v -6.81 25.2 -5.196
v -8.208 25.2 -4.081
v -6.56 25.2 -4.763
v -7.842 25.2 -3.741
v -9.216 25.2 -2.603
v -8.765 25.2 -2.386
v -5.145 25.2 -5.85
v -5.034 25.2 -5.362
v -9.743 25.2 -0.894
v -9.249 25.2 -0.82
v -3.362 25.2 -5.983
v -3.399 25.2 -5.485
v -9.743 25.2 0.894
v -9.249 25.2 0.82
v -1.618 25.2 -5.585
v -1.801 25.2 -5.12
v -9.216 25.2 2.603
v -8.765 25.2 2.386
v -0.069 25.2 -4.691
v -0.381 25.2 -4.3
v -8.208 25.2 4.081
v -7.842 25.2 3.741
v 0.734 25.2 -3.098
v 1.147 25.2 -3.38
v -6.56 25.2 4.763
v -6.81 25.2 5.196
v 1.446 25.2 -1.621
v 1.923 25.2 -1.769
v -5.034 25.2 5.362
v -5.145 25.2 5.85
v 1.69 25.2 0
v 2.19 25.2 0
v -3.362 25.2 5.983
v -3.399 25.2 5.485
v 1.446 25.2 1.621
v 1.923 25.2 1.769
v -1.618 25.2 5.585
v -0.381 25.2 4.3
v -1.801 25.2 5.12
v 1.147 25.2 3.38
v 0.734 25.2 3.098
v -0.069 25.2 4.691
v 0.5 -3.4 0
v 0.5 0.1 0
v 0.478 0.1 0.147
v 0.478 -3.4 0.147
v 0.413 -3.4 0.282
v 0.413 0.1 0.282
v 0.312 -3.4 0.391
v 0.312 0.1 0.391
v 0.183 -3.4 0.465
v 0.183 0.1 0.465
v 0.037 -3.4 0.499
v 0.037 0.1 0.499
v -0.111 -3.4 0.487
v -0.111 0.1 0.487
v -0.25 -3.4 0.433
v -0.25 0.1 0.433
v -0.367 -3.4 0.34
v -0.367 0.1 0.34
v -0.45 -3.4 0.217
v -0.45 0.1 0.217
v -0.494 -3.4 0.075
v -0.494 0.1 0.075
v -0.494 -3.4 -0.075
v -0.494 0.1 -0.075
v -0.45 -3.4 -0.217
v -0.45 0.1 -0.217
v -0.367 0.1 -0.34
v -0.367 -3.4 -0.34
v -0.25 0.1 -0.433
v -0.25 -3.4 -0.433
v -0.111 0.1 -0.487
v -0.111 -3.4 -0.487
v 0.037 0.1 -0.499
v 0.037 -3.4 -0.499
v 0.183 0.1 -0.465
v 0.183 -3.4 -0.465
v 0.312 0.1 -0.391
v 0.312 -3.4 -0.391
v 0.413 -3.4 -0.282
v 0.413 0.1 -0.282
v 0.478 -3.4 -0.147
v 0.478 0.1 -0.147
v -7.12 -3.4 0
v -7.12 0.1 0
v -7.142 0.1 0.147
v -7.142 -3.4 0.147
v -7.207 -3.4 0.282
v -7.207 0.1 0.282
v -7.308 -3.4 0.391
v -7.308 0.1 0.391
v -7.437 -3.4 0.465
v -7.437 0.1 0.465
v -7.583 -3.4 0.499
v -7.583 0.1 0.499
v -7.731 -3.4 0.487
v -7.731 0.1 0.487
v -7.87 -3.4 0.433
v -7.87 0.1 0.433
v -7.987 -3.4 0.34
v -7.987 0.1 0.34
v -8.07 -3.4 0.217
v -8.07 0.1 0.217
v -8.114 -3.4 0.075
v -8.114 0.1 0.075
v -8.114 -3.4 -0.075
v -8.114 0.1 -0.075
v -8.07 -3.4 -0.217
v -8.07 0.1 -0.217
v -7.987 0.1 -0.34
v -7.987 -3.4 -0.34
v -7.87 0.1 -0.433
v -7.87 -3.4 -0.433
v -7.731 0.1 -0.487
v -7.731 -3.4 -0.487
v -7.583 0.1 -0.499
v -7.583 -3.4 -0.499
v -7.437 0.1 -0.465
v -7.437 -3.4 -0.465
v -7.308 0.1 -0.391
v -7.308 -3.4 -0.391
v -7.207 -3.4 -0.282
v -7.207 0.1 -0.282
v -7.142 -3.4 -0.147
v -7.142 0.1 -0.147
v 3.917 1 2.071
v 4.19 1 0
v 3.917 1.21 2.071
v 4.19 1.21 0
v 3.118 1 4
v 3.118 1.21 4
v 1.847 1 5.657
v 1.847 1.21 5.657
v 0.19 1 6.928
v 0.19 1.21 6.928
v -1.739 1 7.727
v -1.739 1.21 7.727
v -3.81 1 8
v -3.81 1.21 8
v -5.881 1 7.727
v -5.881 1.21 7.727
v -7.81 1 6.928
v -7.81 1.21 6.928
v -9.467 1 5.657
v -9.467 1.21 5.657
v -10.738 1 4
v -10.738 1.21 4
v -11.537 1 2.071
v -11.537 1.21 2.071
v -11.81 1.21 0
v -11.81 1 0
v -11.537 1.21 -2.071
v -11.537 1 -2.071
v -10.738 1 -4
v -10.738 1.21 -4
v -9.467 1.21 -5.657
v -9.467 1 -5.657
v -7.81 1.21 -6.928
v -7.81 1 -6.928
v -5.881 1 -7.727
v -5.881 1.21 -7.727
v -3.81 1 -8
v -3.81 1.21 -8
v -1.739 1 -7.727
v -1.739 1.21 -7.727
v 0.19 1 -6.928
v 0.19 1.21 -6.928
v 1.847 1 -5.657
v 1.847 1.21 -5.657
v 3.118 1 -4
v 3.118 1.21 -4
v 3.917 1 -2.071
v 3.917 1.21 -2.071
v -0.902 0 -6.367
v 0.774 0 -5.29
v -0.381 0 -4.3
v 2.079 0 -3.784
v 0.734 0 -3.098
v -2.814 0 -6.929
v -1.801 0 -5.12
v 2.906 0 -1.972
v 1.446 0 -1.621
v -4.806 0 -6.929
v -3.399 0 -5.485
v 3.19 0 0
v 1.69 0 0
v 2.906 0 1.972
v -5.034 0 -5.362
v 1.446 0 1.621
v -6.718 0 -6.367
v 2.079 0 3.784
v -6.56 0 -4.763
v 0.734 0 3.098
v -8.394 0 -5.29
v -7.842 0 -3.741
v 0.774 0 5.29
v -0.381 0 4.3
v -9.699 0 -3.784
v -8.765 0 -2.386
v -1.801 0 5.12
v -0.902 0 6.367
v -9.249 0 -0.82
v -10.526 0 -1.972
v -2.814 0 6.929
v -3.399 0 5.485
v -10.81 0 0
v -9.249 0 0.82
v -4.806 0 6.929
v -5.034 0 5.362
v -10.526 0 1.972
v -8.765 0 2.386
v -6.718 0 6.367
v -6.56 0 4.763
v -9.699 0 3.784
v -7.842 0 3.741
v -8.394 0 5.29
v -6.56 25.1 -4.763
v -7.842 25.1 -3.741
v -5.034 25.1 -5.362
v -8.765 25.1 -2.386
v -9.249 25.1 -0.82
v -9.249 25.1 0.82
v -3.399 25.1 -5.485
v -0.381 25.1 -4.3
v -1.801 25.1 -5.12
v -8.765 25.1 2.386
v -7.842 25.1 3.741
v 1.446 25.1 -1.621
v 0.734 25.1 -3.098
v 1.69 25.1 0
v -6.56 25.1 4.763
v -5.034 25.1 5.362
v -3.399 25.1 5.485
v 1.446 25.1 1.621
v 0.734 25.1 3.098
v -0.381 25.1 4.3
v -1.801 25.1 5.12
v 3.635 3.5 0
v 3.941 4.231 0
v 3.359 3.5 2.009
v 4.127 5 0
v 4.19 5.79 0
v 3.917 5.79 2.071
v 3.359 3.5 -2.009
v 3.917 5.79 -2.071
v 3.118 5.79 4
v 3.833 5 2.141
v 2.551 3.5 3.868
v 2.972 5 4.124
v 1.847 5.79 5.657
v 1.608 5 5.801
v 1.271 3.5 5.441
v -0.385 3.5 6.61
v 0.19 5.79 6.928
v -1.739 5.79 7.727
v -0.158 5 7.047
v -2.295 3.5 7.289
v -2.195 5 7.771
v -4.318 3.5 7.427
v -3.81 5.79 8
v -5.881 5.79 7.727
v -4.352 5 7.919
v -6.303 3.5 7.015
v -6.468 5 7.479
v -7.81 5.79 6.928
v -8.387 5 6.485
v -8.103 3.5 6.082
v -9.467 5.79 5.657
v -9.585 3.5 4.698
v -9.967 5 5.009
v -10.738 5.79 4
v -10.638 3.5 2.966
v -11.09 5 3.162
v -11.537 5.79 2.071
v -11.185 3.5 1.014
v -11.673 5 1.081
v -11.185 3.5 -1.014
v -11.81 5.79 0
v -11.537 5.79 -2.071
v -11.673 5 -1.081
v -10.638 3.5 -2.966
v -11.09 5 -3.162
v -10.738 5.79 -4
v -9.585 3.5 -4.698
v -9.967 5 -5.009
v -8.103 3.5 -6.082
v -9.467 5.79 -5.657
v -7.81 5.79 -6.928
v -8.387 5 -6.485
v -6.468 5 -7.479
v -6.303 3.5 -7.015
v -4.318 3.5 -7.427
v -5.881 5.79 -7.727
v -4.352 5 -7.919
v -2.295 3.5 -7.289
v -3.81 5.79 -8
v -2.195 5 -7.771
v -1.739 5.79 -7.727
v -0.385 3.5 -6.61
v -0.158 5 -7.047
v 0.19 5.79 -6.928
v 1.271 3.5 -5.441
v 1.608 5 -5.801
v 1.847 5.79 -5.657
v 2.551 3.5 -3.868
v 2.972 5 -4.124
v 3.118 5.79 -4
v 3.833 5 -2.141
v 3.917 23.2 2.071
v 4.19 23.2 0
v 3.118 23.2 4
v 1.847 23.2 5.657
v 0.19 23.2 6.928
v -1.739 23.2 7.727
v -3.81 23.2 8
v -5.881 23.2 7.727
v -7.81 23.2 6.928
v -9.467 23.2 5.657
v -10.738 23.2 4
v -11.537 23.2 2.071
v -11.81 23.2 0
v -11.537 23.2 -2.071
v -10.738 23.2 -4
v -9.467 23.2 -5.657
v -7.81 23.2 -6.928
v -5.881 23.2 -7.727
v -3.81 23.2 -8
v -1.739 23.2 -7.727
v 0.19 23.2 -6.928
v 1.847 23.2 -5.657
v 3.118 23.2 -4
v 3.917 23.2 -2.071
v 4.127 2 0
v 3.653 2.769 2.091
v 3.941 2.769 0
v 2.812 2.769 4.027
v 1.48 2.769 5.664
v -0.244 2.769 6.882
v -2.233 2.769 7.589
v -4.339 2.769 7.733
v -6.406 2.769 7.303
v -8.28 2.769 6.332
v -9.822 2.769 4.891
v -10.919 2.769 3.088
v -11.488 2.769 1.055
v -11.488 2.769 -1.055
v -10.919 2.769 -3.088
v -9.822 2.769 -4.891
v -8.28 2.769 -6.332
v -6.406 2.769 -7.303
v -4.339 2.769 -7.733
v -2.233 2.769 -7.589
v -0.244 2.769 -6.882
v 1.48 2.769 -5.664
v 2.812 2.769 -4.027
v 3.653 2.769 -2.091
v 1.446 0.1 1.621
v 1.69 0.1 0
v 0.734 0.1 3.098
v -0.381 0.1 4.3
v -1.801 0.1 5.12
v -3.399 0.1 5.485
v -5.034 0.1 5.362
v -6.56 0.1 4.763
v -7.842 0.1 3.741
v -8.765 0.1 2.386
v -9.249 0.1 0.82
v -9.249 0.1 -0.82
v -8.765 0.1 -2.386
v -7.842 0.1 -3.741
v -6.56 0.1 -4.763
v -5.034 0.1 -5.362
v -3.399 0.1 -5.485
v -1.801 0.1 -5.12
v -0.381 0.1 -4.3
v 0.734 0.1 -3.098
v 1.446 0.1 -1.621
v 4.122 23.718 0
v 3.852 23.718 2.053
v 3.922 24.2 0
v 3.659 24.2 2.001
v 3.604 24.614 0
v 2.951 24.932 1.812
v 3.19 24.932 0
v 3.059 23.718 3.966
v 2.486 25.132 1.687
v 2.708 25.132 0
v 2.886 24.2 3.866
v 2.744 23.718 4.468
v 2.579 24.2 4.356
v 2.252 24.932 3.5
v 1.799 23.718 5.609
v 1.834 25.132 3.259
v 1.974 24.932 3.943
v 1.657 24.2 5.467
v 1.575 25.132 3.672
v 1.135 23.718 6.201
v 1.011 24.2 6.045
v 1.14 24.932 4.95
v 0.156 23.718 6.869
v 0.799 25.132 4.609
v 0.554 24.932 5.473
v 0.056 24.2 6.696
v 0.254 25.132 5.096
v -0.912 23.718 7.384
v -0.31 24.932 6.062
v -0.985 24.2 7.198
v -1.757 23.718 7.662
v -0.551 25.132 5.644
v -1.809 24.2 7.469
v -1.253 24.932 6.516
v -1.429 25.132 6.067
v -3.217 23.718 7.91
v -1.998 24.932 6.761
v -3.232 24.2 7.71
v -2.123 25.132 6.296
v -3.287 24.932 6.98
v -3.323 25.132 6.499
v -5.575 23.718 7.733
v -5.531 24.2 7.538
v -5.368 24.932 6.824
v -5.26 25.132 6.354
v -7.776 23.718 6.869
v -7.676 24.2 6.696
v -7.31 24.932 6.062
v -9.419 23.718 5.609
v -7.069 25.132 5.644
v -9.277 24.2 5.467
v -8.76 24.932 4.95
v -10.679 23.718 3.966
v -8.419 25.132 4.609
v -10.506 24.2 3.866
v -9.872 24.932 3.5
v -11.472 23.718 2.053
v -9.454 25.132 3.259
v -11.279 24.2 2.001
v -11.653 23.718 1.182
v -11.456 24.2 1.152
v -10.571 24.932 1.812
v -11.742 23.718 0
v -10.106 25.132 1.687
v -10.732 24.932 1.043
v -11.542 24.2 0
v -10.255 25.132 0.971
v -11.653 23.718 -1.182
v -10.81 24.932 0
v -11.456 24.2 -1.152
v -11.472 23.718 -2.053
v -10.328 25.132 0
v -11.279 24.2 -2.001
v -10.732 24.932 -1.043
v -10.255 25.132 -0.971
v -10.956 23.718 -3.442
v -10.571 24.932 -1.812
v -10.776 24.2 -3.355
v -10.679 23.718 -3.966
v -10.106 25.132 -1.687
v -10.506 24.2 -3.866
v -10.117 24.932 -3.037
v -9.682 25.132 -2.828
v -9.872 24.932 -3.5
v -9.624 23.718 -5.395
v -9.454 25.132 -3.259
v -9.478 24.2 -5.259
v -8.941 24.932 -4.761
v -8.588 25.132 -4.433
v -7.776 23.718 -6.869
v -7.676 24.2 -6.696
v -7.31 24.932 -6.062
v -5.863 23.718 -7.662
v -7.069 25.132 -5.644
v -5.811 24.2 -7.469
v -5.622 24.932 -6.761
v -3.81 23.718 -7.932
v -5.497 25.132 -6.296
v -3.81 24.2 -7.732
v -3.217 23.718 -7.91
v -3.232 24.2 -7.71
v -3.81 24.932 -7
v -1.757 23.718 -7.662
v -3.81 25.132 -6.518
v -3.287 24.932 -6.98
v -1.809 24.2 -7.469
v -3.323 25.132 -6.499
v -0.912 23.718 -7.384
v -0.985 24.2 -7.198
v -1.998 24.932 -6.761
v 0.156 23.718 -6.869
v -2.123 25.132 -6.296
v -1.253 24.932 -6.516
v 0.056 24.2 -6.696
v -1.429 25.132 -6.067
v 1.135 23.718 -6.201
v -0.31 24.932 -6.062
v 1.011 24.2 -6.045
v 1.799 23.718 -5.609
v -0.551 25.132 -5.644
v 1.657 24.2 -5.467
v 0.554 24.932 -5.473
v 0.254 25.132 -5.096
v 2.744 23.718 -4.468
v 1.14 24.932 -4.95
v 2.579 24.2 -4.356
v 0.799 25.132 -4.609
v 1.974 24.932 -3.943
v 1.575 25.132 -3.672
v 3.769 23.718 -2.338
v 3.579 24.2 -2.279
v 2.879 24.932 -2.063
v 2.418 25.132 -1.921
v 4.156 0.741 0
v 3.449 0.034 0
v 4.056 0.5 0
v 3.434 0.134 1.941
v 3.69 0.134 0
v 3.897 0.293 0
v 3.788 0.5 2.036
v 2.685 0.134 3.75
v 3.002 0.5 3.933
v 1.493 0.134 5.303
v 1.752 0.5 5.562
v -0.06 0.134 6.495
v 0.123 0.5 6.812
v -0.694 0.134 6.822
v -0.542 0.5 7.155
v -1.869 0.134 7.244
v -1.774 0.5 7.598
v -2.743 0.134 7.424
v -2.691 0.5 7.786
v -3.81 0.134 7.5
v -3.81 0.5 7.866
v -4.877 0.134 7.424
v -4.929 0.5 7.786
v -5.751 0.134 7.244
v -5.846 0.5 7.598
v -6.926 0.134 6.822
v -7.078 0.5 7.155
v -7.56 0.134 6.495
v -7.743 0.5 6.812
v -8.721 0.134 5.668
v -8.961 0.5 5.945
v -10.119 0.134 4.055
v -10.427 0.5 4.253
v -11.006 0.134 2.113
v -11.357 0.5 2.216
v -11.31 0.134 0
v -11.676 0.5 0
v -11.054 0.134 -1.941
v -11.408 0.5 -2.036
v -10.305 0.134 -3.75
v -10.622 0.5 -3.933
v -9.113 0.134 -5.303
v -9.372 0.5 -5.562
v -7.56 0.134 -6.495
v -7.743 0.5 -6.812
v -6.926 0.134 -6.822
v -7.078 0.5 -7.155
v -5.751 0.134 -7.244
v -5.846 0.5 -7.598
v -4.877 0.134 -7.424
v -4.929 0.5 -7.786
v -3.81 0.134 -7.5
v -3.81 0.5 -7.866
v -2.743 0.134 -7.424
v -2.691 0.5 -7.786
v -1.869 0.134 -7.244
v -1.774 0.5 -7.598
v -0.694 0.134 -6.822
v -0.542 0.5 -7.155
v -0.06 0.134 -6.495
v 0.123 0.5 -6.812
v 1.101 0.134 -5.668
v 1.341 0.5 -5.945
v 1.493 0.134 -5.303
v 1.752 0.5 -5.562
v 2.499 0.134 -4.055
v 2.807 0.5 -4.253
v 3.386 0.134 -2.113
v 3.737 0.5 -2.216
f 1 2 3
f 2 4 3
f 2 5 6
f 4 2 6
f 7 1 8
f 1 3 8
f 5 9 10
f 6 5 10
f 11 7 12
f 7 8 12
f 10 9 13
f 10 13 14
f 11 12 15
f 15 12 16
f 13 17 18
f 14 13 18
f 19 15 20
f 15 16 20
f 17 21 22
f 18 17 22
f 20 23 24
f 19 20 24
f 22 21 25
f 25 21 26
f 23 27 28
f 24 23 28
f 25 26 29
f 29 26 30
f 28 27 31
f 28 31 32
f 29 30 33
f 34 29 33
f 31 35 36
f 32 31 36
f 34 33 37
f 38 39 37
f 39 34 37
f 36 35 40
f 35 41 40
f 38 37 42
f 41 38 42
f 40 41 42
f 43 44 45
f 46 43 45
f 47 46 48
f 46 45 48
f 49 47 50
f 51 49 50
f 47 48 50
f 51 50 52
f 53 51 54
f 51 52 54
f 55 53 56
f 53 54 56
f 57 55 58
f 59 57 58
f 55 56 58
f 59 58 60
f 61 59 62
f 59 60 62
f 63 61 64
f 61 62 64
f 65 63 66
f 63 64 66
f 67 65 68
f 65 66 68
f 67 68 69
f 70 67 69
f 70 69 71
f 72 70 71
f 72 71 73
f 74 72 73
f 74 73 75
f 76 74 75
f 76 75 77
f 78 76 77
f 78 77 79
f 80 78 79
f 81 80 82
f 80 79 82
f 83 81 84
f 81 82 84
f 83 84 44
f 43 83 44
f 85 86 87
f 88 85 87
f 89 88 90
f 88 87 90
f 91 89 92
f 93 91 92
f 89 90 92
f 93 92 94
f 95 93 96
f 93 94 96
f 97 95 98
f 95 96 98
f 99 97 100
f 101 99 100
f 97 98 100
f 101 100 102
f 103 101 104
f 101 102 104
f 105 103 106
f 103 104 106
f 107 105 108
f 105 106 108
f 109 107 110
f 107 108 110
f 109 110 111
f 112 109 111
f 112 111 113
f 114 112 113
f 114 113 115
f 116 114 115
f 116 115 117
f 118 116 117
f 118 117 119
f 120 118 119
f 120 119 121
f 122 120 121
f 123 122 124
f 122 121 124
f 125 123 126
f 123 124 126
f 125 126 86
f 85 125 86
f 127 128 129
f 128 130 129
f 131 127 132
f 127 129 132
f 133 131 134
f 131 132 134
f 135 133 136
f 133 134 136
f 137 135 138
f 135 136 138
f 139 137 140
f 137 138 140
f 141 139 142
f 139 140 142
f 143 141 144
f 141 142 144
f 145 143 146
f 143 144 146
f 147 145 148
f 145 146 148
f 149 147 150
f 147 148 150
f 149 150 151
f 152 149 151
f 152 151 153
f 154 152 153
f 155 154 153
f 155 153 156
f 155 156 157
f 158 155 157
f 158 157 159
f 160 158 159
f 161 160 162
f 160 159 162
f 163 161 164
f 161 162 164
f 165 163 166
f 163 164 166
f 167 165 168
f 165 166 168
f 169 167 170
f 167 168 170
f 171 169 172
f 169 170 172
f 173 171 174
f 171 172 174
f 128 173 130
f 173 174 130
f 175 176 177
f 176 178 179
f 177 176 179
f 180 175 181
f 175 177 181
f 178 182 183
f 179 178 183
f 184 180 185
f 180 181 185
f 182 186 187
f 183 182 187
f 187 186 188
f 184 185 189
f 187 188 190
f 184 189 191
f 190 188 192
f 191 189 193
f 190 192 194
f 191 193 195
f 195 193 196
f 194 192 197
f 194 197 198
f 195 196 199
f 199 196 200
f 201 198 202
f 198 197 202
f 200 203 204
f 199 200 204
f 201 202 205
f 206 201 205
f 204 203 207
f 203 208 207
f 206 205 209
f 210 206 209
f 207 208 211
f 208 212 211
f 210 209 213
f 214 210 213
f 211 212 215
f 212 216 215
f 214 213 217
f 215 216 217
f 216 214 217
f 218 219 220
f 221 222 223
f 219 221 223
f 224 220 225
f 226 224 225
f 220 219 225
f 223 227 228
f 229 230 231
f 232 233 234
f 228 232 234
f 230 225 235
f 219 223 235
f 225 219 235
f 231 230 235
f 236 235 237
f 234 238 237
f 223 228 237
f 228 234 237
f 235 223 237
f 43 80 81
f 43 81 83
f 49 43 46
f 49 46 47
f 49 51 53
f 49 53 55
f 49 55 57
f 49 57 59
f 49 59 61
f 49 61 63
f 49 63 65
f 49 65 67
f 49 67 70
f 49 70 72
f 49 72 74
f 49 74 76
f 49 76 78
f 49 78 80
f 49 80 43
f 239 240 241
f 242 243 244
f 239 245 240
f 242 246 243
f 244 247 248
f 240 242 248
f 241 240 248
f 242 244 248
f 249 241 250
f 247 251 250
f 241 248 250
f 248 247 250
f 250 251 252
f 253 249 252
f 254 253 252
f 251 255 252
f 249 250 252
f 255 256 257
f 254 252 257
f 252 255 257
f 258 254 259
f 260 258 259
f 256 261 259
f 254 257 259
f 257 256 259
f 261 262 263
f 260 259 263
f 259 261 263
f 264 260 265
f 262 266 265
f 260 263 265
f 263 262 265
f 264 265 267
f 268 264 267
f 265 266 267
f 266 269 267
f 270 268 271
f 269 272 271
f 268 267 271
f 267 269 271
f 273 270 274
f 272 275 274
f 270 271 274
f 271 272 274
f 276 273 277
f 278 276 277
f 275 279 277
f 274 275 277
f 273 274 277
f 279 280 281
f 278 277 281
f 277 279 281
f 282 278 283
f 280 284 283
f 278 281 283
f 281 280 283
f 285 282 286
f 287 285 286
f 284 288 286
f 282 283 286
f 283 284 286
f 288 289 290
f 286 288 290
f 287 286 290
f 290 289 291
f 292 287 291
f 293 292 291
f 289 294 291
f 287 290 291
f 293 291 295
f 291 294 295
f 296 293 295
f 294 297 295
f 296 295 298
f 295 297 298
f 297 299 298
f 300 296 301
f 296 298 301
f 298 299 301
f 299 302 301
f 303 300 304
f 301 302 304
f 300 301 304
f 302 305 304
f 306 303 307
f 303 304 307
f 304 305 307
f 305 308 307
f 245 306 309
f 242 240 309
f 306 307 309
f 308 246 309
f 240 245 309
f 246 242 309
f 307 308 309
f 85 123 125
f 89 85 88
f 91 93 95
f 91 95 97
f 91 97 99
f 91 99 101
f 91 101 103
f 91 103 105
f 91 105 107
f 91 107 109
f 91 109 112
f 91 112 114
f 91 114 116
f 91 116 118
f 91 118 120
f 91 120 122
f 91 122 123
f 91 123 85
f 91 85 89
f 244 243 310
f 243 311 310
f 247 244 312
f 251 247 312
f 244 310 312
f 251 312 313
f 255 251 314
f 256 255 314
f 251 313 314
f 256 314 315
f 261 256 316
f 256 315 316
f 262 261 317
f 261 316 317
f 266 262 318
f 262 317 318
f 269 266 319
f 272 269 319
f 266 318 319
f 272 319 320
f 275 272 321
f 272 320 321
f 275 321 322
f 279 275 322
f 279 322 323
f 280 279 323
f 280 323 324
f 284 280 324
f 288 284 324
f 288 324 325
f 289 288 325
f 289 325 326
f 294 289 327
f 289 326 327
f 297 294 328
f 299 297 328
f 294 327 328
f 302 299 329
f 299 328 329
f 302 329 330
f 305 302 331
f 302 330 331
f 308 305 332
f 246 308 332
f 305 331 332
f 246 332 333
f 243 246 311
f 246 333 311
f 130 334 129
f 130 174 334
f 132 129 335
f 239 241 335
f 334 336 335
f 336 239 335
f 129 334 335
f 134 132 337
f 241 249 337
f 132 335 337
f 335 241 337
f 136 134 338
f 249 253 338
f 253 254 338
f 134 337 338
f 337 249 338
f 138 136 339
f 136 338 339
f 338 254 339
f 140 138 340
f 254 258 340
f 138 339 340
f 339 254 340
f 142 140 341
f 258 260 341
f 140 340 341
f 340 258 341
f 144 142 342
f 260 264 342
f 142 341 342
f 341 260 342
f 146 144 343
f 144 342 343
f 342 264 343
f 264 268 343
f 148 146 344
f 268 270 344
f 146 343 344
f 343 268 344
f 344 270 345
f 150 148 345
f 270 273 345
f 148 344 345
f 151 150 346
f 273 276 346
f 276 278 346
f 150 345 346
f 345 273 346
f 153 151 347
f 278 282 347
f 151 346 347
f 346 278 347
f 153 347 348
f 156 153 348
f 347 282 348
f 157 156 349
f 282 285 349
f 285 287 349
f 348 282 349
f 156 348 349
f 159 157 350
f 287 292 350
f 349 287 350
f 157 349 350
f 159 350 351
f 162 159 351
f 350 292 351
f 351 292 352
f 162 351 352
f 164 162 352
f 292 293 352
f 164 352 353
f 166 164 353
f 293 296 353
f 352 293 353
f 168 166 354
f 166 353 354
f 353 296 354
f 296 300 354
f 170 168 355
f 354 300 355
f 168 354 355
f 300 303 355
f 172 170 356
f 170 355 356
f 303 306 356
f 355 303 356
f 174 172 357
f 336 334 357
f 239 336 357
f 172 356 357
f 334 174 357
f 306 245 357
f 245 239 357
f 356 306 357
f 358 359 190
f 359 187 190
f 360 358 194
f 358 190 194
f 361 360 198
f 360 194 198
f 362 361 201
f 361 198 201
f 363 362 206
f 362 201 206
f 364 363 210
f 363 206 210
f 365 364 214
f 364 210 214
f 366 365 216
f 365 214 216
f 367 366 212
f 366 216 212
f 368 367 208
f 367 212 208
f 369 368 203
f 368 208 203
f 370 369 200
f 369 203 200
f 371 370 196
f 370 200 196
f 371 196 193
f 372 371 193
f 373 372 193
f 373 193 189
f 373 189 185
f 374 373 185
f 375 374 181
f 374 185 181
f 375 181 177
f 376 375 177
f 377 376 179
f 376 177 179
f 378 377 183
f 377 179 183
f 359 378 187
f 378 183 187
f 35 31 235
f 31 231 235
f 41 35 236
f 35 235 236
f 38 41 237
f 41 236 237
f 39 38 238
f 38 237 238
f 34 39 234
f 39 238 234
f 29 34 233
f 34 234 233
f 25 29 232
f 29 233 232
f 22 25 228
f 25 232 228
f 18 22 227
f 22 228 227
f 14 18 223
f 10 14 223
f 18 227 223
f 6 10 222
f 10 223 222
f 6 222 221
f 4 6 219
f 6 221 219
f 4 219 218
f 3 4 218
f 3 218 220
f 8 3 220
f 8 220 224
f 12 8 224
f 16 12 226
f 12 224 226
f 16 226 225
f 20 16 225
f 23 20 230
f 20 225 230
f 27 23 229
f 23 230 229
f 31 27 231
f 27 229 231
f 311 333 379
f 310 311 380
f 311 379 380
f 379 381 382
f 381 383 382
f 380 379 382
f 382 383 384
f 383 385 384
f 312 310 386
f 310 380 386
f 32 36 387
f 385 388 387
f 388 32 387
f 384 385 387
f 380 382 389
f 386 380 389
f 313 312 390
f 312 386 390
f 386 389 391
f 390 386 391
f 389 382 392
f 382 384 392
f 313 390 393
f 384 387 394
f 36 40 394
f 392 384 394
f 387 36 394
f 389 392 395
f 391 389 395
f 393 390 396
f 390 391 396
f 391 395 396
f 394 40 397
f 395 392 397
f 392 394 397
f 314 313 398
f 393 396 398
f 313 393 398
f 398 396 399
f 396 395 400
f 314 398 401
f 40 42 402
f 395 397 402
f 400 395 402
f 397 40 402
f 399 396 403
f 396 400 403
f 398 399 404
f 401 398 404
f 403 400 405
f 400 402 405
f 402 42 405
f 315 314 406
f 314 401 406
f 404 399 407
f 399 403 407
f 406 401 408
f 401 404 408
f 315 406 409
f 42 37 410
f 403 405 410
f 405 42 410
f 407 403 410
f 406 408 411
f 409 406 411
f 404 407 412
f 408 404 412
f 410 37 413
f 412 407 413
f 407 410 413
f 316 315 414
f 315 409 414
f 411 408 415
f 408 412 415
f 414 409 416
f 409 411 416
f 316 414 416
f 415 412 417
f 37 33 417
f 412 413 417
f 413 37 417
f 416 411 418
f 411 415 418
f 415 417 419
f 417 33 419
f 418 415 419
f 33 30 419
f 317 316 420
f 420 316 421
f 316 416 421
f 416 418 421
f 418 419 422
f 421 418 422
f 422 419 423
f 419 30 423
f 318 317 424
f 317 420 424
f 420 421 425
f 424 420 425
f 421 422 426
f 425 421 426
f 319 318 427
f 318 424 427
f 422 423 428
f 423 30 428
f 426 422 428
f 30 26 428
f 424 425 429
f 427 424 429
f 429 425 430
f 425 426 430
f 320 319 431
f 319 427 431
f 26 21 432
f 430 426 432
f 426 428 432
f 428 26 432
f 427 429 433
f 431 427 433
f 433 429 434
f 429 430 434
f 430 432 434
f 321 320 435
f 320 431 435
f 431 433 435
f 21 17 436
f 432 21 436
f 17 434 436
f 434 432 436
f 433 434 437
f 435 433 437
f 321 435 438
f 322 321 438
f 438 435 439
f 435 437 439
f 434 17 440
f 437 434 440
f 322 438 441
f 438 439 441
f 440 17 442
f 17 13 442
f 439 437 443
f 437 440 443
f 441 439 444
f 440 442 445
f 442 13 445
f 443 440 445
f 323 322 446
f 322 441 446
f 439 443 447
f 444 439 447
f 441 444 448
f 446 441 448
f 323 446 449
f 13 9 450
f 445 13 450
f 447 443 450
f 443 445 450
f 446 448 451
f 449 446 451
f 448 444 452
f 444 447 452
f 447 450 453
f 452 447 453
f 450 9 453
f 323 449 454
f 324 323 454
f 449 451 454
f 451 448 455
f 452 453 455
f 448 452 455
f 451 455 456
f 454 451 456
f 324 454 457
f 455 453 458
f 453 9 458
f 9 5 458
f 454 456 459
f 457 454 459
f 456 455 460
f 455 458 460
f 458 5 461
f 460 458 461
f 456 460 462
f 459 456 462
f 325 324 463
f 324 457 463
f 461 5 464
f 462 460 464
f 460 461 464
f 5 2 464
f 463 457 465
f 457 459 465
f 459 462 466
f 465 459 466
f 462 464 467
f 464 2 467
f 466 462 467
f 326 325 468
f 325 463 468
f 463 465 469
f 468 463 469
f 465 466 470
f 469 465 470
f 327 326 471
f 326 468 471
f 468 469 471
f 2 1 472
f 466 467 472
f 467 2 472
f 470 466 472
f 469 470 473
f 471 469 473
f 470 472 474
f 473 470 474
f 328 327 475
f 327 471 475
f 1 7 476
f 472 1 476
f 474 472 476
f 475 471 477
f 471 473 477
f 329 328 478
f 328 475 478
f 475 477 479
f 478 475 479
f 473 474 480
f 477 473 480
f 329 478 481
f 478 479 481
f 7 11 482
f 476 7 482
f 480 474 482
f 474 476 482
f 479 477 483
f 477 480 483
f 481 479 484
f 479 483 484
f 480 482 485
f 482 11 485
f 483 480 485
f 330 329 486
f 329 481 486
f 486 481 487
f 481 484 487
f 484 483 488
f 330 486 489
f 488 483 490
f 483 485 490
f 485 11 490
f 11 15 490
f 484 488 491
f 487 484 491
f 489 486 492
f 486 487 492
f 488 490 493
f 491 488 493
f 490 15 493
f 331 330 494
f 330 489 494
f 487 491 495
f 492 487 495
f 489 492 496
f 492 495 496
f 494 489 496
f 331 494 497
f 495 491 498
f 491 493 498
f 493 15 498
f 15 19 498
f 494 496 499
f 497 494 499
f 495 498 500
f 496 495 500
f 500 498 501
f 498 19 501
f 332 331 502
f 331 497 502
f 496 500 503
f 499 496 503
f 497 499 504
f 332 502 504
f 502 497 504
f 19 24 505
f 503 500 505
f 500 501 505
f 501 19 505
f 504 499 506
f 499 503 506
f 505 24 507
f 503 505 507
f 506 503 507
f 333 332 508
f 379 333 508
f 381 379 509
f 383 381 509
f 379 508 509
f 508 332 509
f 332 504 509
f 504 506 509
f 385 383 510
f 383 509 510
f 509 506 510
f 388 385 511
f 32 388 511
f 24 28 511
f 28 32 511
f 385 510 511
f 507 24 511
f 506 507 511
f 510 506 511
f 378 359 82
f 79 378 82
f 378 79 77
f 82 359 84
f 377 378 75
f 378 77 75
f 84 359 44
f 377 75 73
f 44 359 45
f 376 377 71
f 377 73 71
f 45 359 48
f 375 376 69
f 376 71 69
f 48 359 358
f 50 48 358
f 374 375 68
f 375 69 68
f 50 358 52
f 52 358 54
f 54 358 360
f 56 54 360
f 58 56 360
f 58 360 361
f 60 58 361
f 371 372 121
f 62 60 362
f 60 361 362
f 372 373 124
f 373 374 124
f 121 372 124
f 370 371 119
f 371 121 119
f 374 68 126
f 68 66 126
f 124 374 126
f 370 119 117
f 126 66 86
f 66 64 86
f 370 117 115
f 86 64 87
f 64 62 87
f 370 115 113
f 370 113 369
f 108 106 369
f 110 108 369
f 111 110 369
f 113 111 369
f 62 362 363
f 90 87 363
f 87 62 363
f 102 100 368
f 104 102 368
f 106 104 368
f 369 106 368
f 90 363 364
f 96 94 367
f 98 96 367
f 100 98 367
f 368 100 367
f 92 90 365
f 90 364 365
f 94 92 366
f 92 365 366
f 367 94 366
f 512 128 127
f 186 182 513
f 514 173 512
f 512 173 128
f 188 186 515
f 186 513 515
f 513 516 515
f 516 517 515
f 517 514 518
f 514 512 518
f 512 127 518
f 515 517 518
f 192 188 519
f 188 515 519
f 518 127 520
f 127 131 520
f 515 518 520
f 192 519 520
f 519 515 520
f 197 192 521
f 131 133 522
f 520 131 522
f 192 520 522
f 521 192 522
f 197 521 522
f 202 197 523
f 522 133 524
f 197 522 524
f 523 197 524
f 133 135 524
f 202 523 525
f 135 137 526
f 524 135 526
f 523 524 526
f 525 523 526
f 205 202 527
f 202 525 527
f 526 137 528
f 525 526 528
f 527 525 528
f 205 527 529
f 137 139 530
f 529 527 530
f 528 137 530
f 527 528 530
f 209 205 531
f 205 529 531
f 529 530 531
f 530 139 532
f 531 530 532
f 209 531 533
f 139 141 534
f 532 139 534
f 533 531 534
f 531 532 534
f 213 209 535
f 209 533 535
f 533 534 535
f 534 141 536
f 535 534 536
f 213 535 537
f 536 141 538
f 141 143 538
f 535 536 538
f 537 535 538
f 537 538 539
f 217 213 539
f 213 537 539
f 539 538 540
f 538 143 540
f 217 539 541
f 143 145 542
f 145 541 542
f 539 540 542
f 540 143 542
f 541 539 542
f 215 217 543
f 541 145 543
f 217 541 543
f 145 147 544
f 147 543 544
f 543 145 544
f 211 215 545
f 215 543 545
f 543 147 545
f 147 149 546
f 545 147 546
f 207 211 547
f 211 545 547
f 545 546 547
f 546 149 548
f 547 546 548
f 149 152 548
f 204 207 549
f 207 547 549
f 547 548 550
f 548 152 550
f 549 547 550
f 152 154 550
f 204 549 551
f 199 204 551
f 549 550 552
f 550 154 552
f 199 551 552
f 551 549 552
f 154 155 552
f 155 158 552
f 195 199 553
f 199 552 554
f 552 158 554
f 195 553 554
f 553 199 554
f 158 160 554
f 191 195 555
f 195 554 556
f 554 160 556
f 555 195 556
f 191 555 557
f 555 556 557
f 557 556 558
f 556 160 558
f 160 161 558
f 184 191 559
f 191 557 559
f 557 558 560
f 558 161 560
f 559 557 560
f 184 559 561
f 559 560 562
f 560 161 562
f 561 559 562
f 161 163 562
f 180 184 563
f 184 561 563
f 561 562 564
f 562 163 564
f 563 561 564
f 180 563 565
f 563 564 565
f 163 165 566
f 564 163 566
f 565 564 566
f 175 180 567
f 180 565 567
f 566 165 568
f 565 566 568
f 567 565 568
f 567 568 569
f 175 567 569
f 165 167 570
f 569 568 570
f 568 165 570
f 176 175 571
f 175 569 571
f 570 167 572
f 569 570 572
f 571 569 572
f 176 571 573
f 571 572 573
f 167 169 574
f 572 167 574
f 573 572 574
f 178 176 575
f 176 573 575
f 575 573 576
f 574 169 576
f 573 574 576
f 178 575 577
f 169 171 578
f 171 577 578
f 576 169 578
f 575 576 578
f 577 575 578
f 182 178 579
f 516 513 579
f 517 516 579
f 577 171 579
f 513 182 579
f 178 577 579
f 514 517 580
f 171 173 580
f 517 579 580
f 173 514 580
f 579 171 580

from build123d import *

# Parameters (mm, degrees)
SKETCH2_R           = 0.5
BOSS_EXTRUDE1_DEPTH = 3.5


with BuildPart() as part:
    # Sketch1 → Base-Revolve (revolve)
    with BuildSketch(Plane.XY):
        with BuildLine():
            Line((-3.81, 0.1), (1.69, 0.1))
            Line((1.69, 0.1), (1.69, 0))
            Line((1.69, 0), (3.19, 0))
            ThreePointArc((3.19, 0), (3.897106781, 0.292893219), (4.19, 1))
            Line((4.19, 1), (4.19, 1.21))
            ThreePointArc((4.19, 1.21), (4.049208002, 2.388175538), (3.634760961, 3.5))
            ThreePointArc((3.634760961, 3.5), (4.049208002, 4.611824462), (4.19, 5.79))
            Line((4.19, 5.79), (4.19, 23.2))
            ThreePointArc((4.19, 23.2), (3.604213562, 24.614213562), (2.19, 25.2))
            Line((2.19, 25.2), (1.69, 25.2))
            Line((1.69, 25.2), (1.69, 25.1))
            Line((1.69, 25.1), (-3.81, 25.1))
            Line((-3.81, 25.1), (-3.81, 0.1))
        make_face()
    revolve(axis=Axis((-3.81, 25.2, 0), (0, -1, 0)))

    # Sketch2 → Boss-Extrude1 (add)
    with BuildSketch(Plane.XZ.offset(-0.1)):
        Circle(SKETCH2_R)
        with Locations((-7.62, 0)):
            Circle(SKETCH2_R)
    extrude(amount=BOSS_EXTRUDE1_DEPTH)


solid = part.part
